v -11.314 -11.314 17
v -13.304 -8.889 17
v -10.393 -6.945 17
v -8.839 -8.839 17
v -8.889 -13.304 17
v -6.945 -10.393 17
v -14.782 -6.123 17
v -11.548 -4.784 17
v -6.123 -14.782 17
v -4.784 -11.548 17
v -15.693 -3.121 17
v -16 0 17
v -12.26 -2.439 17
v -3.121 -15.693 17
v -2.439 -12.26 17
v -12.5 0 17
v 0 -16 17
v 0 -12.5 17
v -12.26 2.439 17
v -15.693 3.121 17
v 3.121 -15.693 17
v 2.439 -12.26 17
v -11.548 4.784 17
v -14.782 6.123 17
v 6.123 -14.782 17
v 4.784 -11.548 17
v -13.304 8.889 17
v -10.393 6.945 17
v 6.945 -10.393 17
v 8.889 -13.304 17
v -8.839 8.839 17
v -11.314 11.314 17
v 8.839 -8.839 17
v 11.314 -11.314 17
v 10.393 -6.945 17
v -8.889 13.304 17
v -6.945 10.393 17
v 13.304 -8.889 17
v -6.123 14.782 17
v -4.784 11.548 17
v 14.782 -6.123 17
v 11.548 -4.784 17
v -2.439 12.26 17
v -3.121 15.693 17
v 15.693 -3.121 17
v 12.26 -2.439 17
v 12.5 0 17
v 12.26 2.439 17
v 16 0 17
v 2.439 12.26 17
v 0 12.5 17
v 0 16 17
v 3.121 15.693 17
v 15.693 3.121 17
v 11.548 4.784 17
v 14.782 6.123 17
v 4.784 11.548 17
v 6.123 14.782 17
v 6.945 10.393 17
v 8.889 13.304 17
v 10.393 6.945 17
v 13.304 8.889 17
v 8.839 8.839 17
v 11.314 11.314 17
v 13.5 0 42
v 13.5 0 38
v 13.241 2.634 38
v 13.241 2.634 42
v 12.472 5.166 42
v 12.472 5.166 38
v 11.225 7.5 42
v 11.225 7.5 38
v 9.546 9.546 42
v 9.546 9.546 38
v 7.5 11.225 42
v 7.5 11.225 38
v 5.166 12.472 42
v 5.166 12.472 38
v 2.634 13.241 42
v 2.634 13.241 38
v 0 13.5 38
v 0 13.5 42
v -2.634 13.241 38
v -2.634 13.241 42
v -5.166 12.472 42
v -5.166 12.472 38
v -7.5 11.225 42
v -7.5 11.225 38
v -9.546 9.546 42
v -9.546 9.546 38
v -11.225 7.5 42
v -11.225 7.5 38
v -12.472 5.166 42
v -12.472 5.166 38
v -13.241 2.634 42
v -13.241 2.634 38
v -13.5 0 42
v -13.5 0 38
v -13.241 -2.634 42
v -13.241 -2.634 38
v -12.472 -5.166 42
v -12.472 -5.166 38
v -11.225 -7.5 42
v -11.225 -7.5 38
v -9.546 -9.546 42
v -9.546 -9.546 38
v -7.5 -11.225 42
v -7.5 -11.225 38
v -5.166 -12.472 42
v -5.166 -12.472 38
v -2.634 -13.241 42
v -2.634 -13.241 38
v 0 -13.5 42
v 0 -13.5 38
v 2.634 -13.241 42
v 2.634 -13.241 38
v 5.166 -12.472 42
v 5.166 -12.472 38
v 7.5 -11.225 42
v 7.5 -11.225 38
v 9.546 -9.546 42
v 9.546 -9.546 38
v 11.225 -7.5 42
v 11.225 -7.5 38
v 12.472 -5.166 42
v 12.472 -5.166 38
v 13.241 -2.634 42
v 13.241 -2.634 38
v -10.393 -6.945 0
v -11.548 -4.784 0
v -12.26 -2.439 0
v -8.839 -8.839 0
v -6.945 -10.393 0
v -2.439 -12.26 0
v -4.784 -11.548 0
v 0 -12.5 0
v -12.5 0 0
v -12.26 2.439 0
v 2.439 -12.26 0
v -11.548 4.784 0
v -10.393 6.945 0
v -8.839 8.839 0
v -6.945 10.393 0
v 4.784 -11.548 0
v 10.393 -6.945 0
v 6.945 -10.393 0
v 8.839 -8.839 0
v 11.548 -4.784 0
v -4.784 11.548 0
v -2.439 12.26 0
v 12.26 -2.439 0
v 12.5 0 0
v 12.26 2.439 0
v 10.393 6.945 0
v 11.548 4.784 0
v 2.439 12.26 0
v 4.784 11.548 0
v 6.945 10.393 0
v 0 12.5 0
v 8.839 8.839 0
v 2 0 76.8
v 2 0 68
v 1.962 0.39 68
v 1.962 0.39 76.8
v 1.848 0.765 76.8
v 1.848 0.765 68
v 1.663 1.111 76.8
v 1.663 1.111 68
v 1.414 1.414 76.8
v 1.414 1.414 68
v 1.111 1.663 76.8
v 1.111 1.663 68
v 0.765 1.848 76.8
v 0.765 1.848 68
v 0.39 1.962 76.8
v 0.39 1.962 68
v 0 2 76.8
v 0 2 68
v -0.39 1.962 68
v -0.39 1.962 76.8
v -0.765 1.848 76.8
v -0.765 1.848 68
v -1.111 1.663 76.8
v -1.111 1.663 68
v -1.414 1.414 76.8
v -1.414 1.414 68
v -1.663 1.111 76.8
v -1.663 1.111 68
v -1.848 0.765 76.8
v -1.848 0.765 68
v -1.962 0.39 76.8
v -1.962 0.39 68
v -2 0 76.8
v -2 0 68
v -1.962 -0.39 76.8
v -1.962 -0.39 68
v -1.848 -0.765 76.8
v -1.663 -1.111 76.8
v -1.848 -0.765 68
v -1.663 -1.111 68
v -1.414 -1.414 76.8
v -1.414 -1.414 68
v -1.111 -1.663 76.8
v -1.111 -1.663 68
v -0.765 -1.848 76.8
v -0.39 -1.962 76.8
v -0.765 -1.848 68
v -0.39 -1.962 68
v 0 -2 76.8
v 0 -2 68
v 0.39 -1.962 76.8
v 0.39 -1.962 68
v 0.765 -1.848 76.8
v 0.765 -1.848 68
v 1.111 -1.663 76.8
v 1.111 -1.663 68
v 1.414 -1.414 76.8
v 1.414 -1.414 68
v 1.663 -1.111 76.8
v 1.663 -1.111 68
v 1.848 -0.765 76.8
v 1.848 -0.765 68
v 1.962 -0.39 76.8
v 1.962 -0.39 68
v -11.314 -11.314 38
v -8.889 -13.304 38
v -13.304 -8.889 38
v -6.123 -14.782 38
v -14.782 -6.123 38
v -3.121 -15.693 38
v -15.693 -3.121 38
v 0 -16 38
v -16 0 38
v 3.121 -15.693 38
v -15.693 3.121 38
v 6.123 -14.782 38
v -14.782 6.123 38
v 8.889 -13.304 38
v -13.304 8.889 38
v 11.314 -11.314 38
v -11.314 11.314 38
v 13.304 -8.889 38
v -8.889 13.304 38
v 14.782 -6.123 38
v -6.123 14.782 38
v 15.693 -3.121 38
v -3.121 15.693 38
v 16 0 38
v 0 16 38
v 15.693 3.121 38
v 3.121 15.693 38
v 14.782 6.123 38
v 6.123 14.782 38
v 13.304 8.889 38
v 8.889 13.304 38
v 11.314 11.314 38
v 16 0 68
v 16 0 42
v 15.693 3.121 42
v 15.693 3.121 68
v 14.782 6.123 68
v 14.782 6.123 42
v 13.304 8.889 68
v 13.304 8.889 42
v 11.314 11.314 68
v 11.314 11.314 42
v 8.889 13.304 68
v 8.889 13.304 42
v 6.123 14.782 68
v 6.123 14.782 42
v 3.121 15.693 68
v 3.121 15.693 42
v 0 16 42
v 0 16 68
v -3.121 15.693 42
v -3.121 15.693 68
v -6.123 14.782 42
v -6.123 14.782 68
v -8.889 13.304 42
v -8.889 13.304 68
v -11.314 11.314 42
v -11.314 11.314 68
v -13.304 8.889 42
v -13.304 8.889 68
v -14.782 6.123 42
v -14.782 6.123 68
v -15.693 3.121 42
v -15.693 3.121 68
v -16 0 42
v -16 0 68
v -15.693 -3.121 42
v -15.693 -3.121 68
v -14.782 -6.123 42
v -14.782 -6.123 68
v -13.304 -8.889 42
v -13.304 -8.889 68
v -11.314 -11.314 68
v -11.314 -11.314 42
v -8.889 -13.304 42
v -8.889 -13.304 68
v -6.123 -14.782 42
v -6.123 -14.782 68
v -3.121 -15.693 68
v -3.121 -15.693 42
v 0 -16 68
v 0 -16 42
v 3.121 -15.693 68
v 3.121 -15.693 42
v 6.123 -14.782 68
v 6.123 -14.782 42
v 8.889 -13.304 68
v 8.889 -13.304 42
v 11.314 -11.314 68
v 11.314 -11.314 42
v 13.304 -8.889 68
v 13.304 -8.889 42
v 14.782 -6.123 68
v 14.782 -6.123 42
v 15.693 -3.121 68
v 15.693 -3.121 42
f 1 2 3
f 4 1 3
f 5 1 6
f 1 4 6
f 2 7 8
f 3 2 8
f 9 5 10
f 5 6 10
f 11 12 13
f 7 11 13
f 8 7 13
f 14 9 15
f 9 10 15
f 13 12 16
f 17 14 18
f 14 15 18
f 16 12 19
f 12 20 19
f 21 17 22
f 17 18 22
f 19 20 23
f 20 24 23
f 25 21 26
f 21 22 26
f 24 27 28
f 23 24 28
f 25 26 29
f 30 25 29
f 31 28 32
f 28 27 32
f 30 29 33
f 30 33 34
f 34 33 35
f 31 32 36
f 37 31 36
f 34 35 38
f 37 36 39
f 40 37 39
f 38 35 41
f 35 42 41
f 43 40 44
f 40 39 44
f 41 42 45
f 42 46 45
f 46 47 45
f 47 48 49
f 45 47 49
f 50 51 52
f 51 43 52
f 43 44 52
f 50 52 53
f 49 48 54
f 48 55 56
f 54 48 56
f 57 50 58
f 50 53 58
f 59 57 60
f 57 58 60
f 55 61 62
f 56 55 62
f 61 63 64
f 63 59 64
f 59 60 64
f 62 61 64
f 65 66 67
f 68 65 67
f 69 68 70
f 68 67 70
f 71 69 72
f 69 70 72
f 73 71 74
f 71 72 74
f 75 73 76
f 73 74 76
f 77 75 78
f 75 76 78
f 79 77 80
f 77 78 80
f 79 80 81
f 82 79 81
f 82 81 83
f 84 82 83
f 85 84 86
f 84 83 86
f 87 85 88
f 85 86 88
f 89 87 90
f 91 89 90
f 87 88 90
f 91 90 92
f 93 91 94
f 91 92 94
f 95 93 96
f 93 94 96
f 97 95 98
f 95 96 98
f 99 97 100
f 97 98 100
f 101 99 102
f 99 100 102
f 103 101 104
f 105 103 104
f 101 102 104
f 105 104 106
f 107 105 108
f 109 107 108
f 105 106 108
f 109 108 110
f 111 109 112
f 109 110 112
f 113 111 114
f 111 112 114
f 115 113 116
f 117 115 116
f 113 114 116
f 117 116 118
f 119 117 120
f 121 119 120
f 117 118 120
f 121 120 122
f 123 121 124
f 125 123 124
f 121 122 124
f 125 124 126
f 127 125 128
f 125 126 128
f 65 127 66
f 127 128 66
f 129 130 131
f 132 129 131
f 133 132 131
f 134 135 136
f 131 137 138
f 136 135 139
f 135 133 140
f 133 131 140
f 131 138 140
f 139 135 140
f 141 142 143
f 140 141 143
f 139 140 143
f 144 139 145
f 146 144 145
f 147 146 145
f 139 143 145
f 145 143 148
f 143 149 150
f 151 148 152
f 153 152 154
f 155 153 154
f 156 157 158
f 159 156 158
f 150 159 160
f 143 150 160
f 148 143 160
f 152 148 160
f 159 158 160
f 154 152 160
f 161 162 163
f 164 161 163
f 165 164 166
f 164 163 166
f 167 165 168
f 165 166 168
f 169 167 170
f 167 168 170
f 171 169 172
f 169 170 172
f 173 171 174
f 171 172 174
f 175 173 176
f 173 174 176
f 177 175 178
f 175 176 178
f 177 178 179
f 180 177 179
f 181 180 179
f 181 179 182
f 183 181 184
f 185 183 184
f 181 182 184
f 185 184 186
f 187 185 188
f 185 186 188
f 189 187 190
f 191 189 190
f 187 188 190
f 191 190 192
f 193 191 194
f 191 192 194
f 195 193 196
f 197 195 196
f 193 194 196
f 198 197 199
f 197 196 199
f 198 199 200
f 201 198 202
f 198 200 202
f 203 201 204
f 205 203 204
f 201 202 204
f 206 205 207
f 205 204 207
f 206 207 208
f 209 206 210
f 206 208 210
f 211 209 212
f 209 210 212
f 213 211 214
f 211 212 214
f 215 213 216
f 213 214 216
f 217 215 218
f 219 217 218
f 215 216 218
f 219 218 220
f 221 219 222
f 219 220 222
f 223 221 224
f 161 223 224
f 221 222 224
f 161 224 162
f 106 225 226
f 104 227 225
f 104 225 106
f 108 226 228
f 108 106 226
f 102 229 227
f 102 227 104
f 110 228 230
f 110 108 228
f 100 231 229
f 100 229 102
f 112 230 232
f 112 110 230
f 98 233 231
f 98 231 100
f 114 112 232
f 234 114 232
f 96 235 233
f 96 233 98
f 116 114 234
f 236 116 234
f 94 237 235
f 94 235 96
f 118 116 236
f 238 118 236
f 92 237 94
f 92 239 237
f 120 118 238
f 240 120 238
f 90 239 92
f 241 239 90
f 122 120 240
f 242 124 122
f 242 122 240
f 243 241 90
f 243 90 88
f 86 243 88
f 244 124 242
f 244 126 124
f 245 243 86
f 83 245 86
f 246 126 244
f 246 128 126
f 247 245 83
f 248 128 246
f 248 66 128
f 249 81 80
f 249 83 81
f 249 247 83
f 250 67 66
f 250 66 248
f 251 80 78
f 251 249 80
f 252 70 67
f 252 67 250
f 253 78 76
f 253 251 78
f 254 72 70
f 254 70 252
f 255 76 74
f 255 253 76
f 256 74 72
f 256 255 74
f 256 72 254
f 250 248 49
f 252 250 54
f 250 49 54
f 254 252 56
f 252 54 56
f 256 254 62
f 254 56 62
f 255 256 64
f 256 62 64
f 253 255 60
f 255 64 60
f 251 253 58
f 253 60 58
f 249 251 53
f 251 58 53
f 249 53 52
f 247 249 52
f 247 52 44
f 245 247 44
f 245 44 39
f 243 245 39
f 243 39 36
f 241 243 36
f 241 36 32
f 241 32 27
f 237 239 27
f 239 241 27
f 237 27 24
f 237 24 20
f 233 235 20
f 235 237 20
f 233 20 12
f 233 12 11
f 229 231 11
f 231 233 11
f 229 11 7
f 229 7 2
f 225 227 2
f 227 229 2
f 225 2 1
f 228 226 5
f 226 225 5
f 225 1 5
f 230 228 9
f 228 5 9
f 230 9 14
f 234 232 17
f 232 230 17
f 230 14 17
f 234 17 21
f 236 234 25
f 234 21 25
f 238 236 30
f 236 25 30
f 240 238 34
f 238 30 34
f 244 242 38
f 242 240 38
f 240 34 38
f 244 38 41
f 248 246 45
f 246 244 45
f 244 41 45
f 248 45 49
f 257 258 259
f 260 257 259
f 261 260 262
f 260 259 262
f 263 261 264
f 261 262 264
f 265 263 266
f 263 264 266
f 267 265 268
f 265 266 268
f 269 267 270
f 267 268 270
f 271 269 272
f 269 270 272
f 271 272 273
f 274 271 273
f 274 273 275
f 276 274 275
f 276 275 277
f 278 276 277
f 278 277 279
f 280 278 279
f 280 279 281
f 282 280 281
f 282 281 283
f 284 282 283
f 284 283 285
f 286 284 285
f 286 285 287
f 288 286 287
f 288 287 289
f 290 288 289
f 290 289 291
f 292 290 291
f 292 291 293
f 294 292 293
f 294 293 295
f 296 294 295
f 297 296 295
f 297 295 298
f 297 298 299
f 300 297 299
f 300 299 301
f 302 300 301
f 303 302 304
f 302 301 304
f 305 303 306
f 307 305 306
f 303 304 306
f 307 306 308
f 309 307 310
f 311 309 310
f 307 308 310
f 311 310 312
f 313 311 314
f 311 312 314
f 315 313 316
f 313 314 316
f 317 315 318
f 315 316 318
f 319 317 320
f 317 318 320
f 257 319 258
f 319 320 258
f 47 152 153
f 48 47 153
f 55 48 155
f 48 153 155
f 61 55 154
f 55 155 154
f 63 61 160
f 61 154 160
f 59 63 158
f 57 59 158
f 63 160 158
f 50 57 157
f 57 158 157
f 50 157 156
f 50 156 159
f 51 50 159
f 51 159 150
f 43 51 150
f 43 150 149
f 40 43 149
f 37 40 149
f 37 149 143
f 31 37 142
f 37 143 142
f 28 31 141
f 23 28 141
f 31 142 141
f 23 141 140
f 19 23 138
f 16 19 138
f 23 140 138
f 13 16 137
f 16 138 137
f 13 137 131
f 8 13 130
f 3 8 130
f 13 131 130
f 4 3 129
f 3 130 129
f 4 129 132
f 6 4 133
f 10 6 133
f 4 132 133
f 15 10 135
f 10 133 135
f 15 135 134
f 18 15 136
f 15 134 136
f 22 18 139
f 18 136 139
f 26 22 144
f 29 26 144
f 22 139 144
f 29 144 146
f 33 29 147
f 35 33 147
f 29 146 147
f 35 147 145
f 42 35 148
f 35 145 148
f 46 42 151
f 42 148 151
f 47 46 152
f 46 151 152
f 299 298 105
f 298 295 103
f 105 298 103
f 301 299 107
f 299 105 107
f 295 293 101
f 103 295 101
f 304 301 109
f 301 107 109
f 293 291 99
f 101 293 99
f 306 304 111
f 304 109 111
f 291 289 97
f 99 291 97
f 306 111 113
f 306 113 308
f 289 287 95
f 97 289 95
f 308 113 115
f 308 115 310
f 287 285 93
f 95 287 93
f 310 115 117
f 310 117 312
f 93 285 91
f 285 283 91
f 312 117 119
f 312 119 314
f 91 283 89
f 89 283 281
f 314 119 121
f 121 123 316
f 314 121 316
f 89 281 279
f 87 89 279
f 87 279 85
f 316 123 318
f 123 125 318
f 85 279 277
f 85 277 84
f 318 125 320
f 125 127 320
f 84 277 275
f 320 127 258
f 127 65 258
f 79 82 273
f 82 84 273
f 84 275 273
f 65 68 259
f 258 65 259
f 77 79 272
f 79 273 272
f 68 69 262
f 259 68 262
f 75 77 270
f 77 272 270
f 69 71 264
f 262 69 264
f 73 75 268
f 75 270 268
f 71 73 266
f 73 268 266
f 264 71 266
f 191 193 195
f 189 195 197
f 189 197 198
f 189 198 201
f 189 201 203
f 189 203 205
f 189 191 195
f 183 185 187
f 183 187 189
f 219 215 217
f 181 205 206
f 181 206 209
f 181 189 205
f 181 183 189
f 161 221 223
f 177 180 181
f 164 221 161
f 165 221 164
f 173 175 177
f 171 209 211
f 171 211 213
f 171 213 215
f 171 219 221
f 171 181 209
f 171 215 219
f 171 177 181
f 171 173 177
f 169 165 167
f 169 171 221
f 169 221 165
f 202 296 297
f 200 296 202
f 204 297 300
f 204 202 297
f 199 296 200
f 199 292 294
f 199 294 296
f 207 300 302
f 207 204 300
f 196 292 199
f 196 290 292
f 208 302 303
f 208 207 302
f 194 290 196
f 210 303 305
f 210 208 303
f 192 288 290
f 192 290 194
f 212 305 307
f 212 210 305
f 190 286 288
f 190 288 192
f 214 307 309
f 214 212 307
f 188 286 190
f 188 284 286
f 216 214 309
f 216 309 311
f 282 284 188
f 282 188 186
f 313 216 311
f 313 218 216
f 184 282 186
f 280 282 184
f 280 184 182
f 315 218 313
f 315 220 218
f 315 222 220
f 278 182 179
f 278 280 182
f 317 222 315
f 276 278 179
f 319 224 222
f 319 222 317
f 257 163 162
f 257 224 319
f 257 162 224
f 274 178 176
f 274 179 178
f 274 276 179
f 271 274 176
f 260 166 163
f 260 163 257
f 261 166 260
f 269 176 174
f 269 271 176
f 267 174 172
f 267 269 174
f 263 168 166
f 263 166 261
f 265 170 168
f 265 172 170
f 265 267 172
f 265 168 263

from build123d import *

# Parameters (mm, degrees)
SKETCH_1_R          = 12.5
EXTRUDE_1_DEPTH     = 17
SKETCH_2_R          = 16
EXTRUDE_2_DEPTH     = 51
SKETCH_3_R          = 2
EXTRUDE_3_DEPTH     = 8.8
SKETCH_7_R          = 20.782497367
SKETCH_7_R_2        = 13.5
CUT_EXTRUDE_8_DEPTH = 4


with BuildPart() as part:
    # Эскиз1 → Вытянуть1 (new body)
    with BuildSketch(Plane.XY):
        Circle(SKETCH_1_R)
    extrude(amount=EXTRUDE_1_DEPTH)

    # Эскиз2 → Вытянуть2 (add)
    with BuildSketch(Plane.XY.offset(17)):
        Circle(SKETCH_2_R)
    extrude(amount=EXTRUDE_2_DEPTH)

    # Эскиз3 → Вытянуть3 (add)
    with BuildSketch(Plane.XY.offset(68)):
        Circle(SKETCH_3_R)
    extrude(amount=EXTRUDE_3_DEPTH)

    # Эскиз7 → Вытянуть8 (cut)
    with BuildSketch(Plane.XY.offset(38)):
        Circle(SKETCH_7_R)
        Circle(SKETCH_7_R_2, mode=Mode.SUBTRACT)
    extrude(amount=CUT_EXTRUDE_8_DEPTH, mode=Mode.SUBTRACT)


solid = part.part
